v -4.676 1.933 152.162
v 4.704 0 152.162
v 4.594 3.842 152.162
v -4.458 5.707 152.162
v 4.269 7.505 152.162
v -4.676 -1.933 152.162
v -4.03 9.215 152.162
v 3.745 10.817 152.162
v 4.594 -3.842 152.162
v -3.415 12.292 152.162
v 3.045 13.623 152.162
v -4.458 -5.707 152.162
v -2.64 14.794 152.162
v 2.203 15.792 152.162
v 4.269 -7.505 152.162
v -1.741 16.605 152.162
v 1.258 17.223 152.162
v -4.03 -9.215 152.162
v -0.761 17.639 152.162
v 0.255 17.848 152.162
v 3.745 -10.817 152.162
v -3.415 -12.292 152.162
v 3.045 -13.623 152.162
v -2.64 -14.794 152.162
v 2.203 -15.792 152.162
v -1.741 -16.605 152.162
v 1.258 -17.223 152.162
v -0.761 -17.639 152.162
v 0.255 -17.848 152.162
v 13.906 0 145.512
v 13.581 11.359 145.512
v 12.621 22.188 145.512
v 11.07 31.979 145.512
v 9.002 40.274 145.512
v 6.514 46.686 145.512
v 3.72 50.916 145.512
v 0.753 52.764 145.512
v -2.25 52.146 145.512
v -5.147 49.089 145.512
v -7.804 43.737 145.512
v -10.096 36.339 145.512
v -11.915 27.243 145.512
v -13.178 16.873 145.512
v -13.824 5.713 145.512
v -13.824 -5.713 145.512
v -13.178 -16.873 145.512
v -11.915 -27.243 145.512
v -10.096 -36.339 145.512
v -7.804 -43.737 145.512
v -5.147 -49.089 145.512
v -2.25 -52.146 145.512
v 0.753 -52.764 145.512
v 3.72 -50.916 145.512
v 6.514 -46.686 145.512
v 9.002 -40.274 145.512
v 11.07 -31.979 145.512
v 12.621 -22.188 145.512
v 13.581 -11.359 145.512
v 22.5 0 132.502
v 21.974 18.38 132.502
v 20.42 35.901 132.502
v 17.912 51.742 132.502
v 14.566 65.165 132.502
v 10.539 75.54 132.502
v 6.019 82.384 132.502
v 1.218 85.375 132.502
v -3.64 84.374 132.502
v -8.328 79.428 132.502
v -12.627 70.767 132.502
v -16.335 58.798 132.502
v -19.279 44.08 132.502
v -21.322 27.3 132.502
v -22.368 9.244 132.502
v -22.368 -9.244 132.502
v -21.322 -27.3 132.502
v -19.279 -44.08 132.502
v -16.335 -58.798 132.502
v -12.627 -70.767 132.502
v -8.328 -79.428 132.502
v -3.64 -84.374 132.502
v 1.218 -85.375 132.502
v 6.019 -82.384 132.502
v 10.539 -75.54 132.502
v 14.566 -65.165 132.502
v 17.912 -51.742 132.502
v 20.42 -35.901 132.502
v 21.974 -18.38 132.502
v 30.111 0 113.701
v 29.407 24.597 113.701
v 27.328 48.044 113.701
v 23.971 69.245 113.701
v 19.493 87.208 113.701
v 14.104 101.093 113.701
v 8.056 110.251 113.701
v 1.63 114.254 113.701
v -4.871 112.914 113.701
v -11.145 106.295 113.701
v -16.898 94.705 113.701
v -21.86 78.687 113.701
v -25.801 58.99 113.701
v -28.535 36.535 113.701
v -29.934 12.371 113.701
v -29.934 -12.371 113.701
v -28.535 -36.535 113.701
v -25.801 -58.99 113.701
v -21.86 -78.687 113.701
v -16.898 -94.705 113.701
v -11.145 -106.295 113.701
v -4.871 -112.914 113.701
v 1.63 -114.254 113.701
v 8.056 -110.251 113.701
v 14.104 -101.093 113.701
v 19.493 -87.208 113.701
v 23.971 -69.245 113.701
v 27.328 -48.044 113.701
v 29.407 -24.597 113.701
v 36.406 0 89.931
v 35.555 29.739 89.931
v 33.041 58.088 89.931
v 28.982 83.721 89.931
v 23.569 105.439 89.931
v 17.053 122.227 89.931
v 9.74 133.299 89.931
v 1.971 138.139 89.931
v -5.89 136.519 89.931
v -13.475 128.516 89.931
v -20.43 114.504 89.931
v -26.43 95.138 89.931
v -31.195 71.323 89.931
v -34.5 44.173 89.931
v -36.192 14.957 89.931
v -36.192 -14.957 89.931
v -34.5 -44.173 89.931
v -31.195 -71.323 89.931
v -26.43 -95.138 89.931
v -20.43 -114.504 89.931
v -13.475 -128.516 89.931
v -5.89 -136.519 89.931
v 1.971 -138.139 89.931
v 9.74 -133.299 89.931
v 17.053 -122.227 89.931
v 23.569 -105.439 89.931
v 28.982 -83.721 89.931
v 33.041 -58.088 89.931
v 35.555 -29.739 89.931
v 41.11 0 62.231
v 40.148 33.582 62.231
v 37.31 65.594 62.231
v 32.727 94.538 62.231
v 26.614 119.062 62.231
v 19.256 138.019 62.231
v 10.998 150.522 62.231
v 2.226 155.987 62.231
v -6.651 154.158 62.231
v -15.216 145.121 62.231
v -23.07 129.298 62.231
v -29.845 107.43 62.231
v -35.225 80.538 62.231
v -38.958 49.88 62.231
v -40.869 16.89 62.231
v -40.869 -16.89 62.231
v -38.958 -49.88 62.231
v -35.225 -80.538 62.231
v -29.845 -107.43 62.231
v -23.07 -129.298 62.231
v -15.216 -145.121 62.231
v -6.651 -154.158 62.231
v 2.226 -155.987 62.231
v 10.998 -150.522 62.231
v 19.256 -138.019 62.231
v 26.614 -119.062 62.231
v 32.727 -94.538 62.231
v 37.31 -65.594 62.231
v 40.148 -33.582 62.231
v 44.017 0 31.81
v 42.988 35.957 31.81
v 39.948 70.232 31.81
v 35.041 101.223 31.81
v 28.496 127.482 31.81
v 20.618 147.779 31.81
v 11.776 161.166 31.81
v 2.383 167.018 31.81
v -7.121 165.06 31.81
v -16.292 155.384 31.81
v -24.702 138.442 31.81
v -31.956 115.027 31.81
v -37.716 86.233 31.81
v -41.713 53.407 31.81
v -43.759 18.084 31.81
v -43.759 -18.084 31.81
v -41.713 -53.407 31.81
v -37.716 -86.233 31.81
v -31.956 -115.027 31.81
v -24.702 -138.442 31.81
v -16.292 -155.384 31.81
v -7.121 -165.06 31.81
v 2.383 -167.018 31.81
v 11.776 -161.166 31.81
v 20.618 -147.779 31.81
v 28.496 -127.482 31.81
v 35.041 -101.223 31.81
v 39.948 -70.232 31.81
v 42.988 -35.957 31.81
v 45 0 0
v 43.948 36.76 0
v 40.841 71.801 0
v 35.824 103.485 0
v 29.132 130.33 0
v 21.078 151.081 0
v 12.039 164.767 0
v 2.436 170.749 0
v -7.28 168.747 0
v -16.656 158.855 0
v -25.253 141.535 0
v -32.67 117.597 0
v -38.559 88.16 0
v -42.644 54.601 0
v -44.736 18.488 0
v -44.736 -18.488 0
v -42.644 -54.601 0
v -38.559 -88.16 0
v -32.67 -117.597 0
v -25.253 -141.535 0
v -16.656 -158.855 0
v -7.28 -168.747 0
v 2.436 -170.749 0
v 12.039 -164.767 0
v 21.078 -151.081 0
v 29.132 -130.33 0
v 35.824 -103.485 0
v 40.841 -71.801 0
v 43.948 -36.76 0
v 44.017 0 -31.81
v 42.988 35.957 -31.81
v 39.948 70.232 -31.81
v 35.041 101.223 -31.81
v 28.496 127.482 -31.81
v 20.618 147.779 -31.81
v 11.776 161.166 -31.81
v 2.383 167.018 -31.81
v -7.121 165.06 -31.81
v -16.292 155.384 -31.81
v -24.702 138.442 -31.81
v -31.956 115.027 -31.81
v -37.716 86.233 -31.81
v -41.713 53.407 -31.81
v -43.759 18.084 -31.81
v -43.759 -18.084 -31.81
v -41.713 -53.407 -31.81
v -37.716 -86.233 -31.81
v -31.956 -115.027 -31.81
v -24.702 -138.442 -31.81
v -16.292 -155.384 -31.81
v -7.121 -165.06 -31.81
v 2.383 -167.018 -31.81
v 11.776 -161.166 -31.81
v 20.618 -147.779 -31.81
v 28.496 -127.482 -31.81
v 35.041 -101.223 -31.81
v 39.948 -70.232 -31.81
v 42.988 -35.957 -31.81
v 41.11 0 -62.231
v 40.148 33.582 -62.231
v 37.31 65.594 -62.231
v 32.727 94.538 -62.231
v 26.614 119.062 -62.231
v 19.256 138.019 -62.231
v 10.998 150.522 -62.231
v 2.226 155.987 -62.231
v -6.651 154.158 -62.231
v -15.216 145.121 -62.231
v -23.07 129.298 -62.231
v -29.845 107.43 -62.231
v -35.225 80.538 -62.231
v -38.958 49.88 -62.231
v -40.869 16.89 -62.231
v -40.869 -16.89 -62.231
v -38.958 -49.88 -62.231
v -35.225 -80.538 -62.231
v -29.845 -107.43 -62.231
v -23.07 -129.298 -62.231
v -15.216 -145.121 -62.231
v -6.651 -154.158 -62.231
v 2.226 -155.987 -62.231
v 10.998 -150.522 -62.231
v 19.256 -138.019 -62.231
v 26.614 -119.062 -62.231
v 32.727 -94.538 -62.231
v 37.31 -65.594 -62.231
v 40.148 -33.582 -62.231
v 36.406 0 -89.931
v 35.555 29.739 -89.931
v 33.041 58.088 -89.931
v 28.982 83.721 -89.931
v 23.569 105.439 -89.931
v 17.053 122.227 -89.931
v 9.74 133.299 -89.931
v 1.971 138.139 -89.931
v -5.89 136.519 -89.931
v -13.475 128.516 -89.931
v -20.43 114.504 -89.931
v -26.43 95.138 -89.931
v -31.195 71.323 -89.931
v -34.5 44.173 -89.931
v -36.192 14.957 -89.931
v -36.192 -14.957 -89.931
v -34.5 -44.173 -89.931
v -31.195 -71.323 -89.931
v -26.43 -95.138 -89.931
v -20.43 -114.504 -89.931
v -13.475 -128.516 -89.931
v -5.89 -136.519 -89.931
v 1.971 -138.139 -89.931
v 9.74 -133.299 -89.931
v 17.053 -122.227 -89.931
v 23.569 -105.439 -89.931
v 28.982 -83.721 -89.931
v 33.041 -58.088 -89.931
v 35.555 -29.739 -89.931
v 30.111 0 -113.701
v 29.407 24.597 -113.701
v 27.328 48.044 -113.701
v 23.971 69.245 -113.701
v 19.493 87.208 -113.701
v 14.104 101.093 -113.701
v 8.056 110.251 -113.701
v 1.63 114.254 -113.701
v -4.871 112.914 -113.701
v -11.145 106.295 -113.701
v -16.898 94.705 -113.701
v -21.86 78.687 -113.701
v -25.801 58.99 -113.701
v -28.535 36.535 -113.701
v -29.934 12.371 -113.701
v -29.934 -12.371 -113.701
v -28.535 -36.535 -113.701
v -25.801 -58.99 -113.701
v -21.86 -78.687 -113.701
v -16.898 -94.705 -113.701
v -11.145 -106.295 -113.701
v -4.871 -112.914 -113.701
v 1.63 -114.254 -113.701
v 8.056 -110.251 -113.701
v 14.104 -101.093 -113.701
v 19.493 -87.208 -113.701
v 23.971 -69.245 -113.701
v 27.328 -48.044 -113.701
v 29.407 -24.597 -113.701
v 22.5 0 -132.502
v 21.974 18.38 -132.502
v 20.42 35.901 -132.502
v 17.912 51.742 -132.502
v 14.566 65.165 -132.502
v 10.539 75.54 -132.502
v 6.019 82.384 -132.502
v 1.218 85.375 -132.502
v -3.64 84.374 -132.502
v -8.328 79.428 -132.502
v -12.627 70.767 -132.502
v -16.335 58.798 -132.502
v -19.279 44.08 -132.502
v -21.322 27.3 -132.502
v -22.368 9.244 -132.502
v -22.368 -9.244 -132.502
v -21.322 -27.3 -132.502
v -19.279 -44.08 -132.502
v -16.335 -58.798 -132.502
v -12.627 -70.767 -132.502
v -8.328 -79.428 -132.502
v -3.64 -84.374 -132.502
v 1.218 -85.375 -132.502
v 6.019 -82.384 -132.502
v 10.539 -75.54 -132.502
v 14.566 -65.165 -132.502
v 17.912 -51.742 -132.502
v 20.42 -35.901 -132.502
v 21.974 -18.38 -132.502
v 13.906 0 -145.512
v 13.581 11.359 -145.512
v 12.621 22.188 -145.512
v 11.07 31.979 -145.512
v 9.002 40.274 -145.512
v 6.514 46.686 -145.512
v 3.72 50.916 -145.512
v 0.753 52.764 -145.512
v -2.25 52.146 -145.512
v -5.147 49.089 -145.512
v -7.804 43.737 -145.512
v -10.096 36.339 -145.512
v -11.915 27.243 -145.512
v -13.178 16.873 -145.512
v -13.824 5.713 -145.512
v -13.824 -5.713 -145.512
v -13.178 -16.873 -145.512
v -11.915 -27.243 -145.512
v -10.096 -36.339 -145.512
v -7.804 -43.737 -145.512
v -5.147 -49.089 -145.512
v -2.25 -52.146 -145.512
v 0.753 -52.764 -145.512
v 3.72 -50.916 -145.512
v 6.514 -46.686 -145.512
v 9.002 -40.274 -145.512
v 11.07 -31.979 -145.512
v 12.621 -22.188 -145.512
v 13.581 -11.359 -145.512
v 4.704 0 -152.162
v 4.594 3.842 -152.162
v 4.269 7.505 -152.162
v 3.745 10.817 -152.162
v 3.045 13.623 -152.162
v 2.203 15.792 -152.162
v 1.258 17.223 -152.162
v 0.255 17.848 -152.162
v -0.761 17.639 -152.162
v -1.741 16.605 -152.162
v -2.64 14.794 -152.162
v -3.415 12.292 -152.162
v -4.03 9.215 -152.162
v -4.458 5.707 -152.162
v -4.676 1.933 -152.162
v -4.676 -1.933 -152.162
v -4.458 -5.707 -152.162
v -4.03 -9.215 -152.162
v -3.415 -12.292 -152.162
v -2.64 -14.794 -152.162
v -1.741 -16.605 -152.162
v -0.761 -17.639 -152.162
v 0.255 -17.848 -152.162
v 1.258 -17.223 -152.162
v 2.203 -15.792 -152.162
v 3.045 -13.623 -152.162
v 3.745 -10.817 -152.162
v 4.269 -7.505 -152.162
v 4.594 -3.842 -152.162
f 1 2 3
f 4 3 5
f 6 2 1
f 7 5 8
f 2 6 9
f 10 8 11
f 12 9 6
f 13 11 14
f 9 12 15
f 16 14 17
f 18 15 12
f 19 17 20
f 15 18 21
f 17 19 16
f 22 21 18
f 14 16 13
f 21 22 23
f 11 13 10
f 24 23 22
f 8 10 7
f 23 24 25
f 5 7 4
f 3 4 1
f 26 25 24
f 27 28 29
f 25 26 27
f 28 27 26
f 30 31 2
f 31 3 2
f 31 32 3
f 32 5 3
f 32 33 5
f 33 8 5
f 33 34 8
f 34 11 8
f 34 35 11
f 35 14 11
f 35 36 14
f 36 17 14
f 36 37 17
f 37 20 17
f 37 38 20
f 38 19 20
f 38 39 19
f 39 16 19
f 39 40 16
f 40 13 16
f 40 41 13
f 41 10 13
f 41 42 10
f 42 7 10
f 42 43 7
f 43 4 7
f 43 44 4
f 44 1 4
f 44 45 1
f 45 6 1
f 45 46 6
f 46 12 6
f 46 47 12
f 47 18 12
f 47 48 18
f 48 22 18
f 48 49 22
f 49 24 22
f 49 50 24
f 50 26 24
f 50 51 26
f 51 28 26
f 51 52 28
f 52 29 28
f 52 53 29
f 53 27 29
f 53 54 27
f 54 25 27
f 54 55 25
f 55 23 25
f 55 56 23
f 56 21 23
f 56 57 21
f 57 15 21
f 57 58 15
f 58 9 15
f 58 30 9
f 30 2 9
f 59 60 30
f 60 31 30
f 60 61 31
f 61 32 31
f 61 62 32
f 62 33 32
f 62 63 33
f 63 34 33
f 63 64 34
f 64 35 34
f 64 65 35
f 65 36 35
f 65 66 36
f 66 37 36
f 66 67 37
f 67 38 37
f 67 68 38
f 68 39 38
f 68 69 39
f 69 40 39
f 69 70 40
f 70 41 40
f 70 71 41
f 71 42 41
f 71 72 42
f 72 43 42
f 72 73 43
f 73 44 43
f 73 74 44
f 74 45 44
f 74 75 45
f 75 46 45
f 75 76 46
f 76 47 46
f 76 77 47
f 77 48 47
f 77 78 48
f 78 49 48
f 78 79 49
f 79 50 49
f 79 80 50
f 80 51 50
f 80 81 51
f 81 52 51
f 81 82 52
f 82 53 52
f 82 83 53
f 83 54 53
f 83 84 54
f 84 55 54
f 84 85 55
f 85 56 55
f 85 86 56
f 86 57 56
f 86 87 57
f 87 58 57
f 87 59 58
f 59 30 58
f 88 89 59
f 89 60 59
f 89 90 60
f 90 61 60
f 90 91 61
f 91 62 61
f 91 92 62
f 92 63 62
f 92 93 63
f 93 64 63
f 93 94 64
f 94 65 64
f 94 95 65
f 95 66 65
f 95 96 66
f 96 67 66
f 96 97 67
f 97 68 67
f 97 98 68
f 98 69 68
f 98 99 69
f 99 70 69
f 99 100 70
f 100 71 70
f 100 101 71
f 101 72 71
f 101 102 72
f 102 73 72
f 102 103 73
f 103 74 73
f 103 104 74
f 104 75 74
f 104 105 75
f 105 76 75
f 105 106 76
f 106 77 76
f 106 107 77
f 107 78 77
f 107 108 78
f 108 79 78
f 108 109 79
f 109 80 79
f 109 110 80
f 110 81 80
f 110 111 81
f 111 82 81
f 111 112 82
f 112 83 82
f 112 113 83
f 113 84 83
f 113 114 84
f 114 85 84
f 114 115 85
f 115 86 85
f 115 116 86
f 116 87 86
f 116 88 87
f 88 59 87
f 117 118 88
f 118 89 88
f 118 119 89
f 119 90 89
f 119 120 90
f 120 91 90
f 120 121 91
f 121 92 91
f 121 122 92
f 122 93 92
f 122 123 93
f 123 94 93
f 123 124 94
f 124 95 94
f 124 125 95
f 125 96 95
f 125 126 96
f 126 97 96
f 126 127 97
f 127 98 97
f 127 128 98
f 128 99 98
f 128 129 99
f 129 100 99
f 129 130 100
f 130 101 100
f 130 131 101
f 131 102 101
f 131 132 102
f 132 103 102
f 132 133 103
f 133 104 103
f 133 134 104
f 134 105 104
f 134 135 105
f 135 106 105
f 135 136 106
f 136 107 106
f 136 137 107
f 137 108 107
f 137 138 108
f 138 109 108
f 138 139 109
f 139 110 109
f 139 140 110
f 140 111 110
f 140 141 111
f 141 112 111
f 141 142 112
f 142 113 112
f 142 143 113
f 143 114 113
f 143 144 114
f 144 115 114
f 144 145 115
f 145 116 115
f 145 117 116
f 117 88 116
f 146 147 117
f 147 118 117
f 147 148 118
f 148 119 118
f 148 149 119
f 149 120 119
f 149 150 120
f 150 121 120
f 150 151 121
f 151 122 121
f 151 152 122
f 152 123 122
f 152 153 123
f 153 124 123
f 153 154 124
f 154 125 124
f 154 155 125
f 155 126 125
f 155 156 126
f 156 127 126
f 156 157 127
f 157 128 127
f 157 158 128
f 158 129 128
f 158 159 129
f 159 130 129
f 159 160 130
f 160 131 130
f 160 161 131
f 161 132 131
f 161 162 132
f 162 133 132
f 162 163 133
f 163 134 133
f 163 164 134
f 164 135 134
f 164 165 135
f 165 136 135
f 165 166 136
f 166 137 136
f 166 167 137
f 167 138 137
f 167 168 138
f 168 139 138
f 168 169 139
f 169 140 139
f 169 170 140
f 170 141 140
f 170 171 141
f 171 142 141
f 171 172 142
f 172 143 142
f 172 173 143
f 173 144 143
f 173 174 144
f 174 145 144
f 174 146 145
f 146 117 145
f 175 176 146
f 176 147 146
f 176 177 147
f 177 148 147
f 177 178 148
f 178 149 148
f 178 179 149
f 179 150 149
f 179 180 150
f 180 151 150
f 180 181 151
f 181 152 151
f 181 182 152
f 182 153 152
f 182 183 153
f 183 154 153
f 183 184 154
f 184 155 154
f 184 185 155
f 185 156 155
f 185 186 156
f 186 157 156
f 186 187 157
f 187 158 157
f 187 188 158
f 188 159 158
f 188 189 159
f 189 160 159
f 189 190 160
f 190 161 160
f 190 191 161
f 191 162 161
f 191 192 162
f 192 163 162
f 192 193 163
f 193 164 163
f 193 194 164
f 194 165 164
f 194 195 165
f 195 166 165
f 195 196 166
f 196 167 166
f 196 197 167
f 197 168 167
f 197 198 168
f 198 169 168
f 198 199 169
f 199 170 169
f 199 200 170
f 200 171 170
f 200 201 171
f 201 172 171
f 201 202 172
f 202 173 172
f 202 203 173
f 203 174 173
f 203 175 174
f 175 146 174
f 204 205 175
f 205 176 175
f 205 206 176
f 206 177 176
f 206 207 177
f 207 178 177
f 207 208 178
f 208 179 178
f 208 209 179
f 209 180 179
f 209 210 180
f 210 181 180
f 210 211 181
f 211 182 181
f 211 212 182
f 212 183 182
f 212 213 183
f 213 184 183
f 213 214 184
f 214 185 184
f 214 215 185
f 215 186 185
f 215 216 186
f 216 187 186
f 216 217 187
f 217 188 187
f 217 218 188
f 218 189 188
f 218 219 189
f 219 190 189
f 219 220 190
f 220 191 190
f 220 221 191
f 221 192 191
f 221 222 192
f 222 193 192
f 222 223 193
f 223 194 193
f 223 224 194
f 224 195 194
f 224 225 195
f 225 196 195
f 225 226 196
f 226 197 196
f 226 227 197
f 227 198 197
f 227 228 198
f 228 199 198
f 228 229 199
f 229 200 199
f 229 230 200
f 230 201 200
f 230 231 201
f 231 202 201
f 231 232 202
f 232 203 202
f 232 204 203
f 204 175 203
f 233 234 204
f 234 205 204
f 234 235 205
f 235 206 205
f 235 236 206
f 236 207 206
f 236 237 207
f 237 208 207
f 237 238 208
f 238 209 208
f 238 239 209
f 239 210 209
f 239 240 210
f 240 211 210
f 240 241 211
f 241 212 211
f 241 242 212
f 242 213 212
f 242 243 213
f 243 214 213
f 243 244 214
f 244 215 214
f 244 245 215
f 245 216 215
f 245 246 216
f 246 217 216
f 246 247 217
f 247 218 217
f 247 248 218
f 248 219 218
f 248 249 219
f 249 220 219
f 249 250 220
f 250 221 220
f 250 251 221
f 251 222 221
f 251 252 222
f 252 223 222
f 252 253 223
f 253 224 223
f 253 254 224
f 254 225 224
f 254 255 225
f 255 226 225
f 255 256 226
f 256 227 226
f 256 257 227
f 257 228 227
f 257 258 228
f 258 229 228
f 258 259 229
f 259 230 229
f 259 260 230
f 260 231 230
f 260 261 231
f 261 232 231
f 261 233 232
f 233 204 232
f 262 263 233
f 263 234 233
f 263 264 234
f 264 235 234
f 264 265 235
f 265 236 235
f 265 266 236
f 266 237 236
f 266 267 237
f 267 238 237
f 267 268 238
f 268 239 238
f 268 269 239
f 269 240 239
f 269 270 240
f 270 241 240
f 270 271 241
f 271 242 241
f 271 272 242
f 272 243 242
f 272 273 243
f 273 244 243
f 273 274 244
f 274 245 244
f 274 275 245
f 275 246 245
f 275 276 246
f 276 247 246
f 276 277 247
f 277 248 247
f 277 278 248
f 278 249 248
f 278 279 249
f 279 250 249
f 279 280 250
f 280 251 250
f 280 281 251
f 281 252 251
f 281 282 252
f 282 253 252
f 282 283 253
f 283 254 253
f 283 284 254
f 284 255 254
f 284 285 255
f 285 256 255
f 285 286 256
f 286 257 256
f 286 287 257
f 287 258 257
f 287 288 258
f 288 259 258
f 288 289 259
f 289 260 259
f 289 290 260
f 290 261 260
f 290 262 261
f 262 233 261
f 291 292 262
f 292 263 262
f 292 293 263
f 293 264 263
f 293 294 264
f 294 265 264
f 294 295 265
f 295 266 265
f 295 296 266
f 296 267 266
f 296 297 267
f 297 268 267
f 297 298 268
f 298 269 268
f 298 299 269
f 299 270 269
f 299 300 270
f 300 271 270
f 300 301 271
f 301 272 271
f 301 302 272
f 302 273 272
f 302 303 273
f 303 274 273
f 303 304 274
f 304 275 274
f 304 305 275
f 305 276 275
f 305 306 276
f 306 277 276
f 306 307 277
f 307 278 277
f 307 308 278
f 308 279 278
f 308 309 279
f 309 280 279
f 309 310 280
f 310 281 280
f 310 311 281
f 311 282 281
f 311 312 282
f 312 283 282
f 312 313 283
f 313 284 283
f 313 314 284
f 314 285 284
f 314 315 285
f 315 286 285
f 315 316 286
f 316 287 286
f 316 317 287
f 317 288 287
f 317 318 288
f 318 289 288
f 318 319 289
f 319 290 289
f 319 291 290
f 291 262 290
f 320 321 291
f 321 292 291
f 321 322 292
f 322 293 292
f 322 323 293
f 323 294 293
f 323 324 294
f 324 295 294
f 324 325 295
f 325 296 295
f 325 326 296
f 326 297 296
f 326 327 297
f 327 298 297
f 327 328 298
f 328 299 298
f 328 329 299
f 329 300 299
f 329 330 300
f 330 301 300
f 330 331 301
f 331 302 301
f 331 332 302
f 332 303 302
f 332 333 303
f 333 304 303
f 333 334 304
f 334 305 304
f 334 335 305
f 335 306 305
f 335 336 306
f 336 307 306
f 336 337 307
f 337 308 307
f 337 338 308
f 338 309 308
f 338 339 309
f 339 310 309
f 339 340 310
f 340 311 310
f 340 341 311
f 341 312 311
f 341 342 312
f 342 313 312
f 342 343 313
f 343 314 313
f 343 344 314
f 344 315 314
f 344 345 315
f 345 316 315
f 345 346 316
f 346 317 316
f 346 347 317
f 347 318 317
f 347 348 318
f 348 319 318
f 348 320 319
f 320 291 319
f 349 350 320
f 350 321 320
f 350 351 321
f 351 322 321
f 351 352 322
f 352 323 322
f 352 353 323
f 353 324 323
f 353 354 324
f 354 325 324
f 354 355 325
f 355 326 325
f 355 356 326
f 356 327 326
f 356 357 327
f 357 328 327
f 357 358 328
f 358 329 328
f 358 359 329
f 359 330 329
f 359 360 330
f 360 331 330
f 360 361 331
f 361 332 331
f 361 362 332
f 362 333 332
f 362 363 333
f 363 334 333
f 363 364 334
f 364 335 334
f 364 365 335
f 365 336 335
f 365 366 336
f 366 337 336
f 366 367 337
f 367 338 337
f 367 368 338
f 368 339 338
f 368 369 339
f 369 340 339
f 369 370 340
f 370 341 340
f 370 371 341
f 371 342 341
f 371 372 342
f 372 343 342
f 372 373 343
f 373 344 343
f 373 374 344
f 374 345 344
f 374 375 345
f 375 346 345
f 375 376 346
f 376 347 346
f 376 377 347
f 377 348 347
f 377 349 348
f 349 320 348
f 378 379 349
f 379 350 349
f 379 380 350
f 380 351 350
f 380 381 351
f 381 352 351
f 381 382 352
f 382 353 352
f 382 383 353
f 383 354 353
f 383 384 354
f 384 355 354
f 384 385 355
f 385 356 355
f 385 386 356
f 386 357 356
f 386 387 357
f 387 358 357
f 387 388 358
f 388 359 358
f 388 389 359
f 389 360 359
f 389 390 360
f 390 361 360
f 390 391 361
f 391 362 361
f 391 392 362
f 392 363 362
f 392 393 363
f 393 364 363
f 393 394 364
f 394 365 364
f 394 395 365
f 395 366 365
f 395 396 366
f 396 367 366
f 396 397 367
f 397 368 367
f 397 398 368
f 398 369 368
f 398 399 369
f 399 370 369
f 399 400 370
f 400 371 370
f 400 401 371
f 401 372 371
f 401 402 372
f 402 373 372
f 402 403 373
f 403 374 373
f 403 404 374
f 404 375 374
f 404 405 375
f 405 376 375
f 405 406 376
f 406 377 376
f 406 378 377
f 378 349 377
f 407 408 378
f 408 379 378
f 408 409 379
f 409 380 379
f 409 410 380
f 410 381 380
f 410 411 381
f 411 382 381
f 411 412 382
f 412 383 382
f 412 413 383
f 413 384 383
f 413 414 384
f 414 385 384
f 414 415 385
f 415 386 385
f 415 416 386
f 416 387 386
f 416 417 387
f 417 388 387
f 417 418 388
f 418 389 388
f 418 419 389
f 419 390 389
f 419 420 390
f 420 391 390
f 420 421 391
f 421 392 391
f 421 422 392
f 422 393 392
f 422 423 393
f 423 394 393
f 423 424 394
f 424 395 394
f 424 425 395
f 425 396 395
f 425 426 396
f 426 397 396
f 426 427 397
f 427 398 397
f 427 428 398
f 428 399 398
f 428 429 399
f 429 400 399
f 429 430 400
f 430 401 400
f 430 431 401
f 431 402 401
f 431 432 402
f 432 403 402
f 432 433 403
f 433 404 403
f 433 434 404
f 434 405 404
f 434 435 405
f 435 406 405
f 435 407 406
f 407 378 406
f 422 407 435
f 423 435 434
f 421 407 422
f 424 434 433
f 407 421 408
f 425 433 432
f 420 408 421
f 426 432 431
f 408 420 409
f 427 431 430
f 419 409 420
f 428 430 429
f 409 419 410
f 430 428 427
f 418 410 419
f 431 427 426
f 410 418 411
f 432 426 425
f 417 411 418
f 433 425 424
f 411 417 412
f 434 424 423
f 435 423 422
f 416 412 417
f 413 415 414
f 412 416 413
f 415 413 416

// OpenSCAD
// Generated by SolidPython 1.0.1 on 2020-07-29 00:46:47


scale(v = [5, 19, 17]) {
	sphere(r = 9);
}
/***********************************************
*********      SolidPython code:      **********
************************************************
 
# import packages: SolidPython
from solid import *
from solid.utils import *
from itertools import chain, combinations, permutations


class Resize:

    def __init__(self, scad_file):
        self.scad_file = scad_file
        #self.scad_file = import_scad(scad_file)
        # cone/cylinder param:
        self.r1 = 0
        self.r2 = 0
        self.h = 0
        # rectangular prism param:
        self.w = 0
        self.l = 0
        # ellipse param:
        self.r = 0

    # import OpenScad code (file name corresponds to shape)


    # classify shape + parameters
    def assign(self, param1, param2, param3):
        if self.scad_file == 'cone.scad':
            self.r1 = param1
            self.r2 = param2
            self.h = param3
        elif self.scad_file == 'cylinder.scad':
            self.r1 = param1
            self.r2 = param2
            self.h = param3
        elif self.scad_file == 'rectangularPrism.scad':
            self.h = param1
            self.l = param2
            self.w = param3
        else:
            self.r = param1
            self.h = param2

    # resize parameters
    def iterate(self):
        x = range(3, 20, 2)
        i = 1
        if self.scad_file == 'cone.scad':
            tempList = list(permutations(x, 2))
            for temp in tempList:
                param1 = temp[0]
                param2 = temp[1]
                filepath = 'produced_scad_files/' + 'cone' + str(param1) + '_' + str(param2) + '_' + '.scad'
                scad_render_to_file(cylinder(h=param1, r1=param2, r2=0), filepath)

        elif self.scad_file == 'cylinder.scad':
            tempList = list(permutations(x, 3))
            for temp in tempList:
                param1 = temp[0]
                param2 = temp[1]
                filepath = 'produced_scad_files/' + 'cylinder' + str(param1) + '_' + str(param2) + '_' + '.scad'
                scad_render_to_file(cylinder(h=param1, r1=param2, r2=param2), filepath)

        elif self.scad_file == 'rectangularPrism.scad':
            tempList = list(permutations(x, 3))
            for temp in tempList:
                param1 = temp[0]
                param2 = temp[1]
                param3 = temp[2]
                filepath = 'produced_scad_files/' + 'rectangularPrism' + str(param1) + '_' + str(param2) + '_' + str(
                    param3) + '.scad'
                scad_render_to_file(cube(size=(param1, param2, param3)), filepath)

        elif self.scad_file == 'ellipse.scad':
            tempList = list(permutations(x, 4))
            for temp in tempList:
                param1 = temp[0]
                param2 = temp[1]
                param3 = temp[2]
                param4 = temp[3]
                filepath = 'produced_scad_files/' + 'ellipse' + str(param1) + '_' + str(param2) + '_' + str(param3) + '_' + str(param4) + '.scad'
                scad_render_to_file(scale([param1, param2, param3])(sphere(r=param4)), filepath)

    def render_to_scadfile(self):
        scad_render_to_file(scad, 'example.scad') 
 
************************************************/
